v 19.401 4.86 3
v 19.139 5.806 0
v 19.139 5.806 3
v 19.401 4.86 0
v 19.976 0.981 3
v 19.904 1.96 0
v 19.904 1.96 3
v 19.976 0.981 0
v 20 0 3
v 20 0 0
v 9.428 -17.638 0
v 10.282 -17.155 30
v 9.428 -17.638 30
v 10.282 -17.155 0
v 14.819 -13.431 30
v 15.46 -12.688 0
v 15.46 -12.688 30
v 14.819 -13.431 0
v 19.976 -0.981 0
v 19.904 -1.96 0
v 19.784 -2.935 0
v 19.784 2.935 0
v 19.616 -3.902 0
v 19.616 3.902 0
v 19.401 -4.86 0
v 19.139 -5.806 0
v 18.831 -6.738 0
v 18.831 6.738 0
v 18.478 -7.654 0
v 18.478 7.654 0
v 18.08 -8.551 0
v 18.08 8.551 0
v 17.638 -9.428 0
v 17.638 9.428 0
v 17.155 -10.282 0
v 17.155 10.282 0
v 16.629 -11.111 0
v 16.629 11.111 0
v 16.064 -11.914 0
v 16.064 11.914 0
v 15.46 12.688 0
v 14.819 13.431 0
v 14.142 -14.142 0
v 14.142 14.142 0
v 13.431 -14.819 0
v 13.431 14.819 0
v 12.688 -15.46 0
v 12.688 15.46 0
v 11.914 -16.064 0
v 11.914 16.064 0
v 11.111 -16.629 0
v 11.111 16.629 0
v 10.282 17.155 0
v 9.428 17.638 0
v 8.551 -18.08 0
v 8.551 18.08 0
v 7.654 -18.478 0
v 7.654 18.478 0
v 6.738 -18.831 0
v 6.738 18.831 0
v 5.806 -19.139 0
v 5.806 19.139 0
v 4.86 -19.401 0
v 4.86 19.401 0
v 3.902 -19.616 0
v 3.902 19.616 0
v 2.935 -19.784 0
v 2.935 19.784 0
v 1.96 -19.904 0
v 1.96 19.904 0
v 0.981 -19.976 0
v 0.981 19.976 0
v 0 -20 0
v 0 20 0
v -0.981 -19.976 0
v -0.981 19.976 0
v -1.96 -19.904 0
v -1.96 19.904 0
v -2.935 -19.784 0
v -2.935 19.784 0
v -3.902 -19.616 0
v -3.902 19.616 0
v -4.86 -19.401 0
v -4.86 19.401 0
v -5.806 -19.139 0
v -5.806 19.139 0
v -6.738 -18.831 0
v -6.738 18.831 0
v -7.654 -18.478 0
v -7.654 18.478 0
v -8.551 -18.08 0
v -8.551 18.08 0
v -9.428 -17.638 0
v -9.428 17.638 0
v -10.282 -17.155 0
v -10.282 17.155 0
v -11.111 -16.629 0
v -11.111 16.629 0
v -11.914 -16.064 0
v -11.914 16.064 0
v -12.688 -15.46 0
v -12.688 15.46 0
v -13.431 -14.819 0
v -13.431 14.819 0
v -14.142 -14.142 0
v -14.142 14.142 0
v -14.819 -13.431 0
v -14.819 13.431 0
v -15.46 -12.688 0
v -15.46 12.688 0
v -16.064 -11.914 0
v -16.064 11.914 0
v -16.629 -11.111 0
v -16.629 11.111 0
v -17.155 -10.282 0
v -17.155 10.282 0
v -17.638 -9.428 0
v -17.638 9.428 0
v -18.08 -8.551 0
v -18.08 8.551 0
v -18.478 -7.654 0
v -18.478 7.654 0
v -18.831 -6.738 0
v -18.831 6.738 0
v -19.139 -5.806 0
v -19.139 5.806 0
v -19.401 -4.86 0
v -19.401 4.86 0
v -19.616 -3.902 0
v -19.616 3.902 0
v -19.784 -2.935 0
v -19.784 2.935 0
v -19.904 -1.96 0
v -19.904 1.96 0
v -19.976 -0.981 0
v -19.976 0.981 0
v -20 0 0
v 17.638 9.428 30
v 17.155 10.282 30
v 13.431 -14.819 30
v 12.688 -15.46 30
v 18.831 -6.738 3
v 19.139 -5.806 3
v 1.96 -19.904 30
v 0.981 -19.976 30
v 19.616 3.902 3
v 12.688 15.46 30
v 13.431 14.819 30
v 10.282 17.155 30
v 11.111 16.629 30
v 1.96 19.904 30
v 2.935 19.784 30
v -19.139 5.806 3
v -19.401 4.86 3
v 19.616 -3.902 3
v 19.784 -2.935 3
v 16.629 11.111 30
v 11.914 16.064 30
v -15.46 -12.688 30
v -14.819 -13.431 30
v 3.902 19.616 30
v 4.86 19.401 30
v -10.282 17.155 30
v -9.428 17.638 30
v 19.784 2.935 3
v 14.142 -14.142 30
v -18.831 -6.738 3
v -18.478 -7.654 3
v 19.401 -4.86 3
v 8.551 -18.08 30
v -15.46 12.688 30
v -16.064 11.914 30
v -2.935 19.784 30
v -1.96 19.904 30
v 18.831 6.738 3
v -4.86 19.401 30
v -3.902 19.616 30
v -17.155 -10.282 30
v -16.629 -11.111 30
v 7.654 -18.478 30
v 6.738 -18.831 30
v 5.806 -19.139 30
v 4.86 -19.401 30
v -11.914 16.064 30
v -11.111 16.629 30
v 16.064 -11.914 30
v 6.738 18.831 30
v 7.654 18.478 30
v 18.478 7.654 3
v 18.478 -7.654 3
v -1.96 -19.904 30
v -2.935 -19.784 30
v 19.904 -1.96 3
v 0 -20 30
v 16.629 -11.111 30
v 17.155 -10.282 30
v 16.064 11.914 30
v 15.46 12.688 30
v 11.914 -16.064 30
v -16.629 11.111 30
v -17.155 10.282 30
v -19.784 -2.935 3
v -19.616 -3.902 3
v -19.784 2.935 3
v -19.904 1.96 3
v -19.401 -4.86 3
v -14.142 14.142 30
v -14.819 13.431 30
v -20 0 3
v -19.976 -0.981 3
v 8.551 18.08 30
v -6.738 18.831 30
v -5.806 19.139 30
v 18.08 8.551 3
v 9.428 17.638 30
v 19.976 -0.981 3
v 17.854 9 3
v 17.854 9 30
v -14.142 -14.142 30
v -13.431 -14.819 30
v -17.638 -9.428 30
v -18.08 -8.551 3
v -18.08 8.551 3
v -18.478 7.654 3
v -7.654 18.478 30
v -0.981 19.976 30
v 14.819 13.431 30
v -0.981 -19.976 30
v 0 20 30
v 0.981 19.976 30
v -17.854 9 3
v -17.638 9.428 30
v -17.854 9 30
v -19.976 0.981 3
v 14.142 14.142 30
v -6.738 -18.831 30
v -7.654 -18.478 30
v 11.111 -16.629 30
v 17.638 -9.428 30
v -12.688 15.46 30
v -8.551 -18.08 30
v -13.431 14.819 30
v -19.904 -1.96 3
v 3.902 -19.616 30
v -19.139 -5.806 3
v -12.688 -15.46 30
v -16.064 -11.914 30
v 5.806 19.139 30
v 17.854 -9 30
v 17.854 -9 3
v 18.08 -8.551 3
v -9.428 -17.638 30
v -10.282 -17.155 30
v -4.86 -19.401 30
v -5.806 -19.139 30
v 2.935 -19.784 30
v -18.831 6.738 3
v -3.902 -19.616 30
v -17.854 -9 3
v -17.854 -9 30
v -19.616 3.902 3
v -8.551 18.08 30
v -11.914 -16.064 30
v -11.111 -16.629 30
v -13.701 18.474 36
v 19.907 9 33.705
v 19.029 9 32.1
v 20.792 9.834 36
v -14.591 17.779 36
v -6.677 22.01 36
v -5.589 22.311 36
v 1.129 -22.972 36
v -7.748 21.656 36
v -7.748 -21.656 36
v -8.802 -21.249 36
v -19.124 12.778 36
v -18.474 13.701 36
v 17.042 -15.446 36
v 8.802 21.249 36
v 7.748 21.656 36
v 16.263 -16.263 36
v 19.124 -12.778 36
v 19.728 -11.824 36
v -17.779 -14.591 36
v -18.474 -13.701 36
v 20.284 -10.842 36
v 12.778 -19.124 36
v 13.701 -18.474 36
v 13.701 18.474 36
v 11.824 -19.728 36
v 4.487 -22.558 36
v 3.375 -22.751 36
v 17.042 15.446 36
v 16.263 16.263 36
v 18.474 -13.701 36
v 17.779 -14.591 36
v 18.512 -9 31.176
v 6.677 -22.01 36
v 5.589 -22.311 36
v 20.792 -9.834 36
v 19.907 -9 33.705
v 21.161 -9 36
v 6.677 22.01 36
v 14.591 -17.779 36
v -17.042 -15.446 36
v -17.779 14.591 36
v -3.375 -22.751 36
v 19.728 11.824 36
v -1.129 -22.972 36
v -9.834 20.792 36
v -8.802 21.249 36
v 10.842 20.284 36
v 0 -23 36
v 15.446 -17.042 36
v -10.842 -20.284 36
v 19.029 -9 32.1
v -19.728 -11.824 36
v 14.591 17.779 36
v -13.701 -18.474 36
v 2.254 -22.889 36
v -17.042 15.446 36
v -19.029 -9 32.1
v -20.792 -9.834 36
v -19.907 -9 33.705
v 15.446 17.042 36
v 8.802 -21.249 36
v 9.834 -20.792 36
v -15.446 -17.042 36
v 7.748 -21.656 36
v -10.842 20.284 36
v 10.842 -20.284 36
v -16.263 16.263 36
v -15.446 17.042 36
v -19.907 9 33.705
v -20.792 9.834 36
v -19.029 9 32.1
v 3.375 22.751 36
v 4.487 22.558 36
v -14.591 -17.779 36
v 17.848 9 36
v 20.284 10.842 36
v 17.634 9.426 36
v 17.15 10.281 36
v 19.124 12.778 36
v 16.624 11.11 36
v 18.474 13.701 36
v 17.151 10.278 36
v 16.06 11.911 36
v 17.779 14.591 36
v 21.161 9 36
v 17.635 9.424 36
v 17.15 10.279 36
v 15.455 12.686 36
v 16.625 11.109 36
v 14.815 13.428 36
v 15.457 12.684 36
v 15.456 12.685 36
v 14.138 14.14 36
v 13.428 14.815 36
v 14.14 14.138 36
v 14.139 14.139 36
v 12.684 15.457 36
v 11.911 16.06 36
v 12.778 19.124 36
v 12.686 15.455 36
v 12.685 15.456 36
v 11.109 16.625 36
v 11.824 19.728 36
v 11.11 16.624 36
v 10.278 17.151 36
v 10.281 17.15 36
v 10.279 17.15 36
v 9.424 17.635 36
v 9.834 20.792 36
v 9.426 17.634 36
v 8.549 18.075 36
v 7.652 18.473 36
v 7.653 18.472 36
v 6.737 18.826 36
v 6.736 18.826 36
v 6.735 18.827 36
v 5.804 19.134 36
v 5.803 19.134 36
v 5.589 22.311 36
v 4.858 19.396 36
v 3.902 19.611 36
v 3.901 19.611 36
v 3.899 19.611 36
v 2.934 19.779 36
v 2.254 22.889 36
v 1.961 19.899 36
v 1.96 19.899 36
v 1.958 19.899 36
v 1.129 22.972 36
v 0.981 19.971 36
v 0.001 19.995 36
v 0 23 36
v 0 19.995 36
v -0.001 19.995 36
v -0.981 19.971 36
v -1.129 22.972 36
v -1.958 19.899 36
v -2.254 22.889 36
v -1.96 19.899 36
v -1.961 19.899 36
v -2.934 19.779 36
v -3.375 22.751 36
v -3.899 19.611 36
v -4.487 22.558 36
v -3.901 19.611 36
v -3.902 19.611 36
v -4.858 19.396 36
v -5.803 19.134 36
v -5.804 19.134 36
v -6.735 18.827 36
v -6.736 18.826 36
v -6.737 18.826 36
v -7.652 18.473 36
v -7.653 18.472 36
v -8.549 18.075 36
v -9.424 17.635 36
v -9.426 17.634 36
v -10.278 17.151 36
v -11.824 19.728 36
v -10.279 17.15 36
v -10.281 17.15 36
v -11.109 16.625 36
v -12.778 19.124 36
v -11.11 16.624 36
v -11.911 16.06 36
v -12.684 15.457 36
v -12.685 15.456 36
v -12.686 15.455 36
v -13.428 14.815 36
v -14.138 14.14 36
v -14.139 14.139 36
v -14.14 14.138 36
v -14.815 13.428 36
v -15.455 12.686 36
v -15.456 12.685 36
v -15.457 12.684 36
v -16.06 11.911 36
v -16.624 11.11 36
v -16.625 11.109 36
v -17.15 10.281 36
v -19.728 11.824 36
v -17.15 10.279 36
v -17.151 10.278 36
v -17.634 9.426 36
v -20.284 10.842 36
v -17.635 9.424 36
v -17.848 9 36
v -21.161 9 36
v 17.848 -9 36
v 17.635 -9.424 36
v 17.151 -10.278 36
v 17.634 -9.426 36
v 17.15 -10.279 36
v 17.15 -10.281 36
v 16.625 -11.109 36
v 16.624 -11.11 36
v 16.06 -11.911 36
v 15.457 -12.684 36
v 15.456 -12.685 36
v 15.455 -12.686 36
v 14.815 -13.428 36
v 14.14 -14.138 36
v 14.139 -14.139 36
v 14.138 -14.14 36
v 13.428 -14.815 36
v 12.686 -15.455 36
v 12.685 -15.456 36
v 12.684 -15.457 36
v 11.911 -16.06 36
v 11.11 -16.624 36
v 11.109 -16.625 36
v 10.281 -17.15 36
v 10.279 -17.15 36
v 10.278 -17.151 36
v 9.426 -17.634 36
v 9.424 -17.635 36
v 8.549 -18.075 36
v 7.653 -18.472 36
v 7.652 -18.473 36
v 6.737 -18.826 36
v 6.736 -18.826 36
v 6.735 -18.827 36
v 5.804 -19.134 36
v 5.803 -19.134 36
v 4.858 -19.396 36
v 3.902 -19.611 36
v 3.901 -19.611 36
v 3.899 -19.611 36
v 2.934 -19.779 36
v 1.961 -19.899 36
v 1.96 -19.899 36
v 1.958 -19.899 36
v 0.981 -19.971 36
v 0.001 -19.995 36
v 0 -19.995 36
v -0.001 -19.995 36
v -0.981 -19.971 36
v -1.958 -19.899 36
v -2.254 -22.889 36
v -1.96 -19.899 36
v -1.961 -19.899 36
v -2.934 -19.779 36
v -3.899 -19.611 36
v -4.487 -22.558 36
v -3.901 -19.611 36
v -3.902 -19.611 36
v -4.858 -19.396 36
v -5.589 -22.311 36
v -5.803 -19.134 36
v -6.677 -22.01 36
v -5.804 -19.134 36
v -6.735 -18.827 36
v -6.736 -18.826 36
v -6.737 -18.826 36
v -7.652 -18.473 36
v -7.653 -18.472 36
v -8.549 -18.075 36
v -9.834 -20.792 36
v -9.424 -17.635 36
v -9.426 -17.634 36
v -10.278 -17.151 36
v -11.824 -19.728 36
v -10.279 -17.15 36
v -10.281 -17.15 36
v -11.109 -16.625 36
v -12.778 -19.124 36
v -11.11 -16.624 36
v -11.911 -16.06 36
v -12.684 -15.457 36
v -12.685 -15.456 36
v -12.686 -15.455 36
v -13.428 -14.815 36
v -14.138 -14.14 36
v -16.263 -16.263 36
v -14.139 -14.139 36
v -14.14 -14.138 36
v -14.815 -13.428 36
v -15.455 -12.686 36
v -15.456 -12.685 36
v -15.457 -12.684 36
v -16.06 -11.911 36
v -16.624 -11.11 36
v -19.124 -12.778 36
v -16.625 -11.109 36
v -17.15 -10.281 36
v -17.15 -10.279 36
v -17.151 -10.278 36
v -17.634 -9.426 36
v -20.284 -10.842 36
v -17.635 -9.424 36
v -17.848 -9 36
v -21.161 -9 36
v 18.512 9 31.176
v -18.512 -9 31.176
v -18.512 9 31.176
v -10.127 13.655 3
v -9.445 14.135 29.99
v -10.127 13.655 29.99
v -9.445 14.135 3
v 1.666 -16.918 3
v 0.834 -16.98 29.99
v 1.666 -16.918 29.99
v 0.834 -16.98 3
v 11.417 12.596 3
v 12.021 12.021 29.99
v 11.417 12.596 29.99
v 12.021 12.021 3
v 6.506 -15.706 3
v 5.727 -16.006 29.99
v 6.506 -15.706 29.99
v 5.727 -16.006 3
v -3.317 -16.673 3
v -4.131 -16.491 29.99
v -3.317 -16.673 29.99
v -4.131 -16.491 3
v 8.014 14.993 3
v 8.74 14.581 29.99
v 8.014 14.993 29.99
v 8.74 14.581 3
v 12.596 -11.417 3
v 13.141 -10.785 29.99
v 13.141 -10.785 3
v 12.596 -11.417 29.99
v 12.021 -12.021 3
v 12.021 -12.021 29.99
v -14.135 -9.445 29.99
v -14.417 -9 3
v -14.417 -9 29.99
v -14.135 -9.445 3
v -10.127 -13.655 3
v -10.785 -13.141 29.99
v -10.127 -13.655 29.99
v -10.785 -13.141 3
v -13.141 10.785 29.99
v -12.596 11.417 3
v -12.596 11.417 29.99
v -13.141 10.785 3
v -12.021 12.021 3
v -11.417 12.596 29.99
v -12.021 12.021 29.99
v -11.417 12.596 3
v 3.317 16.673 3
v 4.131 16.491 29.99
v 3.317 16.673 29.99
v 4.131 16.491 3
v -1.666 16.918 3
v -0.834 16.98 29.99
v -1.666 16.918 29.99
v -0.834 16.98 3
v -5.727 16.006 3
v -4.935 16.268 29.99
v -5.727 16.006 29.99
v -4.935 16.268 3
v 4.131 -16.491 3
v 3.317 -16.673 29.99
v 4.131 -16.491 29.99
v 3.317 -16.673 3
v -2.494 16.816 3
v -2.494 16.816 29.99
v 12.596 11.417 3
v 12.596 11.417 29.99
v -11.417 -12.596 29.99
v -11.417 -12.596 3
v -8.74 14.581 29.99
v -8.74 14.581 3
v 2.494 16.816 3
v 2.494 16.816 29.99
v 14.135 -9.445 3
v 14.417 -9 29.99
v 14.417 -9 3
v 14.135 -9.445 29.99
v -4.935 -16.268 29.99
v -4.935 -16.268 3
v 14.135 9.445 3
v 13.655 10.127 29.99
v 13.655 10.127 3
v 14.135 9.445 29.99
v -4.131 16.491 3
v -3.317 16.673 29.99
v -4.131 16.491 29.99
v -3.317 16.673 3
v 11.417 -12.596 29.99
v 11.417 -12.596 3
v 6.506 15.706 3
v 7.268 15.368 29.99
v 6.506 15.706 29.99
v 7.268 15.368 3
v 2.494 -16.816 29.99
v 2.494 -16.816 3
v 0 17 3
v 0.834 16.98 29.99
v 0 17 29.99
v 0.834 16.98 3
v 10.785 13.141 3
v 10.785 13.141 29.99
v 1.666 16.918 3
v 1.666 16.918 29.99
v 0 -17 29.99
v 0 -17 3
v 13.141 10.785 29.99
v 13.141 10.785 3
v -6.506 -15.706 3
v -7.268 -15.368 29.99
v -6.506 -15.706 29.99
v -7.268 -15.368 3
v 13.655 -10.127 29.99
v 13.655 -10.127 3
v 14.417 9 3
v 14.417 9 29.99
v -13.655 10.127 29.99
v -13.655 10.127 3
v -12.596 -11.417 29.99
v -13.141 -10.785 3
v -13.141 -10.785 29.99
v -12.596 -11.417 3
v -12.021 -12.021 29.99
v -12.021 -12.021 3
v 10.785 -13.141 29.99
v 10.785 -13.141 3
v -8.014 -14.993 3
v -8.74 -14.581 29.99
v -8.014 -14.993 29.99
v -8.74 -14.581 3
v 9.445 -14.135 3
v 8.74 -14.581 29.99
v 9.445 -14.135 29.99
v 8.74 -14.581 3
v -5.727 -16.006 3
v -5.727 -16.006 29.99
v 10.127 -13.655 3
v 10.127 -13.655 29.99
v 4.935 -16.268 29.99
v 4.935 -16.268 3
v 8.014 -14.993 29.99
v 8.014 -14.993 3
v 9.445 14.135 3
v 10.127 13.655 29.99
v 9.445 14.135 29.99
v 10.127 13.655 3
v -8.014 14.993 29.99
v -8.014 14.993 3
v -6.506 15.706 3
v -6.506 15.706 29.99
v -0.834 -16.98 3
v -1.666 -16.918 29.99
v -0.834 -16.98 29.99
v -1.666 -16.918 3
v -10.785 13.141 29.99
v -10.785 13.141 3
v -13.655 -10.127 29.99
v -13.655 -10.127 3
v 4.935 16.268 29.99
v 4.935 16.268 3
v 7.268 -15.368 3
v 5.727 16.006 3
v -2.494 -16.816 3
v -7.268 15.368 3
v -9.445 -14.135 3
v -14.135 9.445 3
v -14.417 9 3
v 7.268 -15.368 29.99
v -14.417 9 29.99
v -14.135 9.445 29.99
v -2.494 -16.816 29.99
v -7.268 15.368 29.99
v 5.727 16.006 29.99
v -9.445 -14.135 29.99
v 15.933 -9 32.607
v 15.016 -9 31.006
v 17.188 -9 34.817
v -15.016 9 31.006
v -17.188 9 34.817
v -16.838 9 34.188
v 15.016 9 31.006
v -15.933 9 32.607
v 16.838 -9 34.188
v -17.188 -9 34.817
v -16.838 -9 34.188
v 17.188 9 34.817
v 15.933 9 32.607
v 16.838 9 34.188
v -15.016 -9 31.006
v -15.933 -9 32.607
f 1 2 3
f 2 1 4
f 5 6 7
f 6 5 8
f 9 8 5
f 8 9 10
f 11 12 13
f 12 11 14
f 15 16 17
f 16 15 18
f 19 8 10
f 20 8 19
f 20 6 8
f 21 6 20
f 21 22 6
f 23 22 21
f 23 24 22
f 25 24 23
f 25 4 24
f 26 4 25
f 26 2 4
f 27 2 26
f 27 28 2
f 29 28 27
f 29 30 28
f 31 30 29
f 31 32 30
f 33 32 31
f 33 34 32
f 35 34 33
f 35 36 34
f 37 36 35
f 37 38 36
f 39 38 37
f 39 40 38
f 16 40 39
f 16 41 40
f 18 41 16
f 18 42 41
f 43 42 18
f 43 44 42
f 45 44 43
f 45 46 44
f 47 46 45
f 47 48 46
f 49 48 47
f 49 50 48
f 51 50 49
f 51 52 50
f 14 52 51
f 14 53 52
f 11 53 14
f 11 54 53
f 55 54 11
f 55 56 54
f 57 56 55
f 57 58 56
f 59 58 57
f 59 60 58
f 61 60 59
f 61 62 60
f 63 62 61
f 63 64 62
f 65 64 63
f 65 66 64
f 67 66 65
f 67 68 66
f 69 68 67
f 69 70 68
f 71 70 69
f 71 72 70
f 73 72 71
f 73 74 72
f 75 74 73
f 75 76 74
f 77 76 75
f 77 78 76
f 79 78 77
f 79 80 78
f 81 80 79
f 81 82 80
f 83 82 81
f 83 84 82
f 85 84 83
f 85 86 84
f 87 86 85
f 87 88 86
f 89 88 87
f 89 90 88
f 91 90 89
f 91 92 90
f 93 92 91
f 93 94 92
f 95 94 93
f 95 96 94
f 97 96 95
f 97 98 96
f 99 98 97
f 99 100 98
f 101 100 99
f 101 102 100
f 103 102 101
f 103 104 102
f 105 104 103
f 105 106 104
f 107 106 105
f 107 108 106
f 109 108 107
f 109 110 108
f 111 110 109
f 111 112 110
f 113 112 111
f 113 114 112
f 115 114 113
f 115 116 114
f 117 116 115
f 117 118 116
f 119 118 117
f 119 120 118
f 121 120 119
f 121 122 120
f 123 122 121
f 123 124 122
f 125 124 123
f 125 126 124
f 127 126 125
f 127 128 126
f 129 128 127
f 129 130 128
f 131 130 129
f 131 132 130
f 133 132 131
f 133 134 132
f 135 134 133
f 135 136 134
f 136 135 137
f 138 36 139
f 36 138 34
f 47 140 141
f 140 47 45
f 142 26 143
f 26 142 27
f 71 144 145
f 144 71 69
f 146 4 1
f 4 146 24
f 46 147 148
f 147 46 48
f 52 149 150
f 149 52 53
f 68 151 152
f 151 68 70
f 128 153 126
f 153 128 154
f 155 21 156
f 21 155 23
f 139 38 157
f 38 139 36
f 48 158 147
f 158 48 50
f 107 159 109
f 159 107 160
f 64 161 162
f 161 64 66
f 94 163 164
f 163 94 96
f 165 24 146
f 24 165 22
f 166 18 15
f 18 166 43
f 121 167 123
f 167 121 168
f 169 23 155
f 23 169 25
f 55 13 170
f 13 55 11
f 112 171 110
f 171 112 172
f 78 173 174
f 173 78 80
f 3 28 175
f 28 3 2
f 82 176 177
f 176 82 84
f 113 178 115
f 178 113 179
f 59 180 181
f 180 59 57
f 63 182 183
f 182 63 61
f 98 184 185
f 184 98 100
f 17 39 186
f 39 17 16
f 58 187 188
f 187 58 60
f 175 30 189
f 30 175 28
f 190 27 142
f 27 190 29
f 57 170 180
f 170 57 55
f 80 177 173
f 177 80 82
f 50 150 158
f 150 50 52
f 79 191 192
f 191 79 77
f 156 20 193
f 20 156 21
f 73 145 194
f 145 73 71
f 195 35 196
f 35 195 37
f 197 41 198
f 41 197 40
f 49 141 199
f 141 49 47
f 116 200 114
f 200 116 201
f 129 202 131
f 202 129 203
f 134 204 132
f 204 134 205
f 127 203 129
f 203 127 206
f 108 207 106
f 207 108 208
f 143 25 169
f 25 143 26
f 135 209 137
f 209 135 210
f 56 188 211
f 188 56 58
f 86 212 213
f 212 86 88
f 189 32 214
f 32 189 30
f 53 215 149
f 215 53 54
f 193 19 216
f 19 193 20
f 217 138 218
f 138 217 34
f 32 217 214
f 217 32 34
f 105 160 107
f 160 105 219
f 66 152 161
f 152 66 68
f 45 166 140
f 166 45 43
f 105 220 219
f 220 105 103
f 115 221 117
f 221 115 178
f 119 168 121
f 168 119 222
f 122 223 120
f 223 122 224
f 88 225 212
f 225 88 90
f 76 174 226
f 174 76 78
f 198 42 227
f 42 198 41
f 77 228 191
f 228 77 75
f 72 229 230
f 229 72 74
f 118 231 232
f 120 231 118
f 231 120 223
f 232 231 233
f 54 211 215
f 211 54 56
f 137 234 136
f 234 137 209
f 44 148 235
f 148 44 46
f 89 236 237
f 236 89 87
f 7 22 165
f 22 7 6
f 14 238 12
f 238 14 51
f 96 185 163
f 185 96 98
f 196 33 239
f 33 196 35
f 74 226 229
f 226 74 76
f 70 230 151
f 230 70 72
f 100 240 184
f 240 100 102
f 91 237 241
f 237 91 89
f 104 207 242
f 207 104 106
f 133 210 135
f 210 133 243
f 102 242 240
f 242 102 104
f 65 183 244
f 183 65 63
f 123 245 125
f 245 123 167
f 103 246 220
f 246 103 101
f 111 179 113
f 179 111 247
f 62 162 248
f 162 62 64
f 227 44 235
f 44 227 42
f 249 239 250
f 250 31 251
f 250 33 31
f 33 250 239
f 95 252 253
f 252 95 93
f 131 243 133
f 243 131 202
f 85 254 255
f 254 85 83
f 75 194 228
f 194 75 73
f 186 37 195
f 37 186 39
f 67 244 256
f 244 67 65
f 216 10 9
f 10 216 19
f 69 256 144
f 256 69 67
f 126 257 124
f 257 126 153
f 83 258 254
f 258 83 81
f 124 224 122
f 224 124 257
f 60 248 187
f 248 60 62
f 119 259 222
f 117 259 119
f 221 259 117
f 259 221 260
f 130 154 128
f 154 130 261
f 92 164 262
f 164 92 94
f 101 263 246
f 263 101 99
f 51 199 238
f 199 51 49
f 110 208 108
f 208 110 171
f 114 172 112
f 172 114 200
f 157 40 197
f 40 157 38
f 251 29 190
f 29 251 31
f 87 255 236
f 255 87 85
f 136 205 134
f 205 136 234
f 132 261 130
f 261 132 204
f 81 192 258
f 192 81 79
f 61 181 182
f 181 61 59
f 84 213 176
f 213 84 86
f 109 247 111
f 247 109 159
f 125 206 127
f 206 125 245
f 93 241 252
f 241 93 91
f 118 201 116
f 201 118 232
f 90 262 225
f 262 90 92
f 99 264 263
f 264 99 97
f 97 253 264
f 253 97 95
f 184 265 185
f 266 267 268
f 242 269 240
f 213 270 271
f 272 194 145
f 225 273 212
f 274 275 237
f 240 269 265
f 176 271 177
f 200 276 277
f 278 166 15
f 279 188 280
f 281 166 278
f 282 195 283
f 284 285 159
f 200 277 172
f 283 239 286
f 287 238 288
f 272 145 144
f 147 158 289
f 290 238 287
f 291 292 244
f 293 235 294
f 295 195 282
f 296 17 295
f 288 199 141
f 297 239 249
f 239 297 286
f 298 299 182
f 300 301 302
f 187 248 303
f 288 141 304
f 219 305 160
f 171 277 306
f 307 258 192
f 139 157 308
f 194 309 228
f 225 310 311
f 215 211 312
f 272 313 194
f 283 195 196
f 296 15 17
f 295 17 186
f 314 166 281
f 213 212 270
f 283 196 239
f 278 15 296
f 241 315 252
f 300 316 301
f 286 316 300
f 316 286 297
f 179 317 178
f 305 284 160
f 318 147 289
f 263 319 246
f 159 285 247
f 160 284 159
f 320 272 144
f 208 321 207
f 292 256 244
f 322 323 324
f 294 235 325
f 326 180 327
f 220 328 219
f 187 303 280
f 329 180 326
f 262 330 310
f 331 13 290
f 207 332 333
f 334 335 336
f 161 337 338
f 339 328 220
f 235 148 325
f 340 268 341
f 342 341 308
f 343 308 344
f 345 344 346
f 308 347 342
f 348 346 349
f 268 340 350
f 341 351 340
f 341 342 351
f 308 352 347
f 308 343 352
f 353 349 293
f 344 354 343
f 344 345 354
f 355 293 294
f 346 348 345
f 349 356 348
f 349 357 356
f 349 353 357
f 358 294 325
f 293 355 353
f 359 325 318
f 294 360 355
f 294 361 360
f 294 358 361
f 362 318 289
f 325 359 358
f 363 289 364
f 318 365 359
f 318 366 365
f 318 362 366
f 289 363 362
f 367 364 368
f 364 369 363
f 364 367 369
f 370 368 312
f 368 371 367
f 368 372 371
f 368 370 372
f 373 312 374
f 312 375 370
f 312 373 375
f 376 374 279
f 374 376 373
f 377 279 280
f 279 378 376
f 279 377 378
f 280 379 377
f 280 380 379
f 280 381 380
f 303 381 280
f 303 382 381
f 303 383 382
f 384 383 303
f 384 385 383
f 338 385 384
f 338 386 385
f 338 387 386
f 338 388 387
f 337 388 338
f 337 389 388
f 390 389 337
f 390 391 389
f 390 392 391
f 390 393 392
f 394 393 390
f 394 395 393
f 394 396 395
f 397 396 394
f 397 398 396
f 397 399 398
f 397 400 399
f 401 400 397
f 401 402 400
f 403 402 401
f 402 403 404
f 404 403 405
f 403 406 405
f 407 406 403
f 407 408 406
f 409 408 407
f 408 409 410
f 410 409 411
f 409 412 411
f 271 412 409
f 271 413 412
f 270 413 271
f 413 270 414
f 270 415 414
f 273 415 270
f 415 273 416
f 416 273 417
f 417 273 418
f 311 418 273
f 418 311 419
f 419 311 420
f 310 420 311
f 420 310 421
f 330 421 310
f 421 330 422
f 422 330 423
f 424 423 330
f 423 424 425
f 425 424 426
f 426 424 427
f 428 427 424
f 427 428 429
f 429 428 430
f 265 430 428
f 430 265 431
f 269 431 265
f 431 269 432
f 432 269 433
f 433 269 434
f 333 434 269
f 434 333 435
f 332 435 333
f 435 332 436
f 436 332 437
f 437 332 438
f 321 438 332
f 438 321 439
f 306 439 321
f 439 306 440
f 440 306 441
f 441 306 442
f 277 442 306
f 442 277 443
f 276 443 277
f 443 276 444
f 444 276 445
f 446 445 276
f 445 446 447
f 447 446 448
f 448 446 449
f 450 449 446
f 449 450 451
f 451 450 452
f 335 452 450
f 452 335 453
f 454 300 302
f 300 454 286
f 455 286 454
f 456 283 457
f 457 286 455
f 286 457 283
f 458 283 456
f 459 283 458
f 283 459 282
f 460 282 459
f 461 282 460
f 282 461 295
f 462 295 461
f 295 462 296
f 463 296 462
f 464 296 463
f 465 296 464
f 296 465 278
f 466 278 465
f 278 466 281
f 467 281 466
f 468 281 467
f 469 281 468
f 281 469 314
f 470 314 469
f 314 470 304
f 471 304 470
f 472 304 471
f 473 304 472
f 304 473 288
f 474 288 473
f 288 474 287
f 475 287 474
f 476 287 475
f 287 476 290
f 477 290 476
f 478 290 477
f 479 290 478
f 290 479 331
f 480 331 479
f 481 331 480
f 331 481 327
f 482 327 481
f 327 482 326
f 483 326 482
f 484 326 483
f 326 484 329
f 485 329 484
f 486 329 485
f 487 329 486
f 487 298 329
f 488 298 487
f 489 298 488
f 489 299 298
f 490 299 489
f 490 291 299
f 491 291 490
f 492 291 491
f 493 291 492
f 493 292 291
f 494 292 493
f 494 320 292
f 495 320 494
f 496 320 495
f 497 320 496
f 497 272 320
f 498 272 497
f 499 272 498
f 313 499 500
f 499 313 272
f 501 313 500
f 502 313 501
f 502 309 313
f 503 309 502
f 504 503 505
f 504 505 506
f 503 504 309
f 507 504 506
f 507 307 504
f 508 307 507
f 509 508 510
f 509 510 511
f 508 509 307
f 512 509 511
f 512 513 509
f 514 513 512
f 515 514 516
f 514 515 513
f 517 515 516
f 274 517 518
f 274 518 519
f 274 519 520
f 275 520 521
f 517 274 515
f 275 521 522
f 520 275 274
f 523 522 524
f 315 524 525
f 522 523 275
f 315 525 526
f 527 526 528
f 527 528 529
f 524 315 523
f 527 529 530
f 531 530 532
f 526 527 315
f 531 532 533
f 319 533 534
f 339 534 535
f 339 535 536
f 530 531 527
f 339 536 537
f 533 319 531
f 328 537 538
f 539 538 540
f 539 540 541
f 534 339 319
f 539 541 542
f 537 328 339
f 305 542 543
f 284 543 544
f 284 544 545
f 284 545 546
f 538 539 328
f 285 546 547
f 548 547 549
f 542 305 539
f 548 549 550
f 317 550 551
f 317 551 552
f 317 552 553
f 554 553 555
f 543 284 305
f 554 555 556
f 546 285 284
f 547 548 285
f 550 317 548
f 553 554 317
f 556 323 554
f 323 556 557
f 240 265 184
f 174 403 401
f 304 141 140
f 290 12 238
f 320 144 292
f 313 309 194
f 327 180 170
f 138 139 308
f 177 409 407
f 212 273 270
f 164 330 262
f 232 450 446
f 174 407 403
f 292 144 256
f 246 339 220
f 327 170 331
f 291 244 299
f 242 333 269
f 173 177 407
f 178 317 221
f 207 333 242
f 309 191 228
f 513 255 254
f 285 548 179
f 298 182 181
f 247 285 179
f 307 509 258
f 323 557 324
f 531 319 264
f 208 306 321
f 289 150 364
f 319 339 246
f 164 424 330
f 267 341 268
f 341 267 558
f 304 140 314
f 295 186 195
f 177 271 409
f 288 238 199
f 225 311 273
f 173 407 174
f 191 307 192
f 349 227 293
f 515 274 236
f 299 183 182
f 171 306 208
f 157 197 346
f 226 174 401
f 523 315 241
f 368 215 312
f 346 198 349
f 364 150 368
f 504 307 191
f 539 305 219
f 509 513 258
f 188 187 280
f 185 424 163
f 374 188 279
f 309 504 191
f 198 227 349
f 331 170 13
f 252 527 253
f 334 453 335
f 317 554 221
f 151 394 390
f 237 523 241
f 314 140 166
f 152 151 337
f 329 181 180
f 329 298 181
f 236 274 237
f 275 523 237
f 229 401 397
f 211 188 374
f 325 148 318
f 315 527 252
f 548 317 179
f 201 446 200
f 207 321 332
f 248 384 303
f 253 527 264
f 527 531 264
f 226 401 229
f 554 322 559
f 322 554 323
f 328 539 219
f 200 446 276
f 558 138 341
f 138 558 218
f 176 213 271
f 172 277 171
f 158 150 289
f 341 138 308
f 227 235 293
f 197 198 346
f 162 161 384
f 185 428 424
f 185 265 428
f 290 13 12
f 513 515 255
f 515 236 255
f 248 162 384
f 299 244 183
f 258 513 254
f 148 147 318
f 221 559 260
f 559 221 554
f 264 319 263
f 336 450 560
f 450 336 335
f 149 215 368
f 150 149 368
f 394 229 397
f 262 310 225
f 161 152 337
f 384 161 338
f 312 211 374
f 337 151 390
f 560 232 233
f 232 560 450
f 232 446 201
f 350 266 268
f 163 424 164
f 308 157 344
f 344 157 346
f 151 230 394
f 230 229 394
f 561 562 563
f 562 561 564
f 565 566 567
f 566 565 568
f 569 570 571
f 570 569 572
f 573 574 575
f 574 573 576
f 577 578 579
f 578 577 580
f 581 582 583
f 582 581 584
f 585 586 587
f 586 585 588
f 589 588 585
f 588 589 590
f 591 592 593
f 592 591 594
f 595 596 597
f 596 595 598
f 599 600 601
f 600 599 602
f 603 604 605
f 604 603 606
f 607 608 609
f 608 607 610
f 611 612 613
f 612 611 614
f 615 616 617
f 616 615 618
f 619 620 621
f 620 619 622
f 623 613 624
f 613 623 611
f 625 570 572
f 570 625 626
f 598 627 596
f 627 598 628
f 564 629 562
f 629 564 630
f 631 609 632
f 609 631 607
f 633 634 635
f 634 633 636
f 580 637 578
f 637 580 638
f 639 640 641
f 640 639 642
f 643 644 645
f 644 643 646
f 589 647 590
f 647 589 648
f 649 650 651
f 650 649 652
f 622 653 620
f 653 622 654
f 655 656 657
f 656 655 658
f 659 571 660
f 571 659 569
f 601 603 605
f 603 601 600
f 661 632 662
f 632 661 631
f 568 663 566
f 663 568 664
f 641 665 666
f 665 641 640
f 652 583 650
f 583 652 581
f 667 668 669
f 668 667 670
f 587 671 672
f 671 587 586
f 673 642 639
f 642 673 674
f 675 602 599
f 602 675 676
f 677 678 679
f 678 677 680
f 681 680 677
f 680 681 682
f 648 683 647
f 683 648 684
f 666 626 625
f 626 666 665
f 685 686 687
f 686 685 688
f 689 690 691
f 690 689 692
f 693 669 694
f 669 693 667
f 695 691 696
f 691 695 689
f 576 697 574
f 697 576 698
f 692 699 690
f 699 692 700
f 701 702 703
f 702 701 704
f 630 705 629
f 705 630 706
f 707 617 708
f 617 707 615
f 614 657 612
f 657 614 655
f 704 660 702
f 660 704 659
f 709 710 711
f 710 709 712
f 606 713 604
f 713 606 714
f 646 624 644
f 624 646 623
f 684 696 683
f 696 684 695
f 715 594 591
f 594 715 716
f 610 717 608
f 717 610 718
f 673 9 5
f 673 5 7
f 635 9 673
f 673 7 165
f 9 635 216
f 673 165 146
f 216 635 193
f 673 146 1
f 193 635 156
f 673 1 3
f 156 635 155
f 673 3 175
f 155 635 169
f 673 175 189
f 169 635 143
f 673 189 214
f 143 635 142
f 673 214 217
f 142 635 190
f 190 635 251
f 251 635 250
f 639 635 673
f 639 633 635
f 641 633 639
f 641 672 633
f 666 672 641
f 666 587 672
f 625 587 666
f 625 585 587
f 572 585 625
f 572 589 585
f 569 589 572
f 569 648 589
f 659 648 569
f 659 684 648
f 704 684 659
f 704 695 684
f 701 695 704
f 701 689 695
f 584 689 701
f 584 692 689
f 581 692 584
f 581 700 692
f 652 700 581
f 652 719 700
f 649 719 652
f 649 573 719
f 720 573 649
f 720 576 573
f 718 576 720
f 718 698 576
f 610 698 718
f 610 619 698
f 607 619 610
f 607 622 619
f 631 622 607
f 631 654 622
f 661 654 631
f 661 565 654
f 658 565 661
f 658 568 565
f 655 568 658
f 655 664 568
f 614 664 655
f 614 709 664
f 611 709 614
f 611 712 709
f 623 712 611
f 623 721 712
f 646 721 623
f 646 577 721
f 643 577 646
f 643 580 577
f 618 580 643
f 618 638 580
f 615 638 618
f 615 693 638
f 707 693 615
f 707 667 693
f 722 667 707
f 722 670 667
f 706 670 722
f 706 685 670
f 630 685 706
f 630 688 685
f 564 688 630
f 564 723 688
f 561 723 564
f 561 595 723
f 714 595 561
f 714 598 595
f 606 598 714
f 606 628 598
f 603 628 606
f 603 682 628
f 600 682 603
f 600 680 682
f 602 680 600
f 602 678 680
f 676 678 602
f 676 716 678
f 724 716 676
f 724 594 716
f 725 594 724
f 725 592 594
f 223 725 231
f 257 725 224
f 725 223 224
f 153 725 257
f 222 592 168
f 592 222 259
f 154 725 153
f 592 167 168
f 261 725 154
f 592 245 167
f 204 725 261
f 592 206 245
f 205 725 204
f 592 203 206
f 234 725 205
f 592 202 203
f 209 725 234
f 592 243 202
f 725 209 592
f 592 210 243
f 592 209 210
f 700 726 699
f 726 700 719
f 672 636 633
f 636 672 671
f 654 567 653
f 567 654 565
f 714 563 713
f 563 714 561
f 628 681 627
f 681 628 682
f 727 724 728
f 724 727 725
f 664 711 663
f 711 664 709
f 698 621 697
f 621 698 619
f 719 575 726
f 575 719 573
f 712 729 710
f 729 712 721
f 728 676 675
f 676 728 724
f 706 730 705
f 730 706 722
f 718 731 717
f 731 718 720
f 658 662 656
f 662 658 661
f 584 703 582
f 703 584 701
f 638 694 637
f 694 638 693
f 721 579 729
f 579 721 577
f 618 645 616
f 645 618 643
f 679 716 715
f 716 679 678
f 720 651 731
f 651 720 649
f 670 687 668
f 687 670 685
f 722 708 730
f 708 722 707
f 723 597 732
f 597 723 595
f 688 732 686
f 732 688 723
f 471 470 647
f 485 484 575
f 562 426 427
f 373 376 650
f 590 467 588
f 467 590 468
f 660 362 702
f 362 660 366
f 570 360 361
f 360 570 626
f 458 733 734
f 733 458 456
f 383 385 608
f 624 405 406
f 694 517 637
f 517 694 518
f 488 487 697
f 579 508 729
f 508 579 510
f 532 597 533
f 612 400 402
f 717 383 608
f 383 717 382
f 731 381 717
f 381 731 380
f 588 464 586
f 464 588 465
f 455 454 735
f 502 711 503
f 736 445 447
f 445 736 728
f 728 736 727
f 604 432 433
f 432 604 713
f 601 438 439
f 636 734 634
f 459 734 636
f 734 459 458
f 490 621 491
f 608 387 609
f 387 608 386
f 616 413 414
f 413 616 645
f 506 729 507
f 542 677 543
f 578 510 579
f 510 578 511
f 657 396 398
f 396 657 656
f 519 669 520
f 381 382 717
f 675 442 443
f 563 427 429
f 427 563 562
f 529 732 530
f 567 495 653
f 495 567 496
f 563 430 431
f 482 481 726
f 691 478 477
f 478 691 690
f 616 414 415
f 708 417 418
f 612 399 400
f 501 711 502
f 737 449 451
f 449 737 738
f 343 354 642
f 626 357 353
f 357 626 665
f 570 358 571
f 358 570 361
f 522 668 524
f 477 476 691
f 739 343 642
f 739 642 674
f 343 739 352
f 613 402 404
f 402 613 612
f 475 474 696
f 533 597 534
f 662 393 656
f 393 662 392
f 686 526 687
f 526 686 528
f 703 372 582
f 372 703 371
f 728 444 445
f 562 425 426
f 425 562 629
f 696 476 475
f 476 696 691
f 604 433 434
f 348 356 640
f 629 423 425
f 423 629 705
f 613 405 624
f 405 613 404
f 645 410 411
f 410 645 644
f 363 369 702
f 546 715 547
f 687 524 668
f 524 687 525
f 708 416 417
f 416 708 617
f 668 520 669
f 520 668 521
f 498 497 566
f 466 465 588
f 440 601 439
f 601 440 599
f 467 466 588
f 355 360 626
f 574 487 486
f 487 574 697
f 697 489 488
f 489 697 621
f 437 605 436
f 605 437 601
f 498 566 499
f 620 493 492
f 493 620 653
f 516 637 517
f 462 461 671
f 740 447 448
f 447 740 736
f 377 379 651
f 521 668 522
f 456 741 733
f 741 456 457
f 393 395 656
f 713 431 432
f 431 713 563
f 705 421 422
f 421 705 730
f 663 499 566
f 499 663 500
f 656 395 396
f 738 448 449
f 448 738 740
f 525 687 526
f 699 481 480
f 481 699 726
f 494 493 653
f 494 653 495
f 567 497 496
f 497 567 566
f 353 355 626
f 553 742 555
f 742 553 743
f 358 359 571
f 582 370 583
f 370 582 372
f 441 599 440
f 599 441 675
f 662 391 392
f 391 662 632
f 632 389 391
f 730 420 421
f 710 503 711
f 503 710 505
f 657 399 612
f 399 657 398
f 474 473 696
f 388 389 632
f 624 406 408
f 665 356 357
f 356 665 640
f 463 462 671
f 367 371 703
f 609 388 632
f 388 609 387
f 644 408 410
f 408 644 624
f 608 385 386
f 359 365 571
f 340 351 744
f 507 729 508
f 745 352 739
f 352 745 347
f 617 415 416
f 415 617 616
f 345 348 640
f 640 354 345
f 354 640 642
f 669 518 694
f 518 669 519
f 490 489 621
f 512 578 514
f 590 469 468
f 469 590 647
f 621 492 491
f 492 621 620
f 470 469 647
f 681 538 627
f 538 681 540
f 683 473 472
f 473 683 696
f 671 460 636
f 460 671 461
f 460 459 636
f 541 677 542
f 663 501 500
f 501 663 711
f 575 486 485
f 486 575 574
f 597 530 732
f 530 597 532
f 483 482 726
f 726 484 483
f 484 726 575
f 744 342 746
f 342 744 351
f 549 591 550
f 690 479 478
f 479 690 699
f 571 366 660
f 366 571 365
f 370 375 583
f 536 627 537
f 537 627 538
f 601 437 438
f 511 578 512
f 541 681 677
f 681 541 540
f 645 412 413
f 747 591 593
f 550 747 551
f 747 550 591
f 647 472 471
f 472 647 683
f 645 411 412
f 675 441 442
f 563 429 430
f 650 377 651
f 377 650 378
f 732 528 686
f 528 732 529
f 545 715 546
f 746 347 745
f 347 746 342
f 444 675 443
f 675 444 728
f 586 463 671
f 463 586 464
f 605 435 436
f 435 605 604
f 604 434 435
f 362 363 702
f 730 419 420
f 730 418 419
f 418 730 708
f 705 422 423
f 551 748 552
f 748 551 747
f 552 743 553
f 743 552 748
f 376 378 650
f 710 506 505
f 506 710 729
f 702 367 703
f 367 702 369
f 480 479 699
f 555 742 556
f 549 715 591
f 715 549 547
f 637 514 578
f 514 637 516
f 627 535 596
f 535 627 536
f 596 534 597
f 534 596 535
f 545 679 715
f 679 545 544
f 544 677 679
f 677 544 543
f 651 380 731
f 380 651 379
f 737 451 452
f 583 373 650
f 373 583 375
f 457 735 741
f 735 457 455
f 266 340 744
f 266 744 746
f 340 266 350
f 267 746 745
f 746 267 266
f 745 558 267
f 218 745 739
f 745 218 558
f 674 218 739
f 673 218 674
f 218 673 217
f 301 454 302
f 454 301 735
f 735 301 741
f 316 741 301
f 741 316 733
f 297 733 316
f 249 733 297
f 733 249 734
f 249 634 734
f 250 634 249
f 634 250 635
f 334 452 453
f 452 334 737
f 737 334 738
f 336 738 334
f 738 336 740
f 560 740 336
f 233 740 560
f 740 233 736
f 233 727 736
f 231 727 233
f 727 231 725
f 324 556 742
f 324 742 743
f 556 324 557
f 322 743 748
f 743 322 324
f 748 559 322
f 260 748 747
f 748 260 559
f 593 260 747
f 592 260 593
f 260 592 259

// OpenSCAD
// =============================================================
//  connect_four_top_grab_chute.scad  (v3 — cylinder with open sides)
//  Vertical piece dispenser — top-down gripper access
//
//  HOW IT WORKS
//  ------------
//  1. Drop pieces in from the open top — they stack flat (horizontal).
//  2. The arm descends from above (-Z) with fingers open (spread wide
//     in X, outside the tube diameter). No walls at ±X, so fingers
//     have unobstructed vertical travel.
//  3. At disc level, gripper closes: fingers move inward in X and
//     contact the TOP disc's rim at the 9-o'clock and 3-o'clock
//     positions.
//  4. Arm lifts the disc straight up, clears the tube.
//  5. Wrist rotates 90° — disc is now vertical (edge-down).
//  6. Arm moves over the target column, opens gripper → disc falls in.
//  7. Gravity drops the remaining stack down one disc-height. Repeat.
//
//  WHY A CYLINDER WITH WIDE OPENINGS
//  -----------------------------------
//  The ±X openings remove the cylinder wall in the finger-approach
//  zone, giving the gripper unobstructed vertical travel. The
//  remaining arc walls at ±Y self-center the round disc (curved wall
//  matches disc perimeter), which is better than flat walls.
//  The disc cannot fall out: the ±Y arcs constrain it to < 1.5 mm
//  lateral play in X.
//
//  TOP VIEW (cross-section)
//  ------------------------
//
//     finger              finger
//       │                    │
//       ↓                    ↓
//   (open +X side)     (open -X side)
//
//       ╔══════════════════╗
//       ║  arc wall (+Y)   ║
//       ╠══╡           ╞══╣   ← opening_w wide — fingers pass here
//       ║       ●          ║   ← disc, constrained by ±Y arcs
//       ╠══╡           ╞══╣
//       ║  arc wall (-Y)   ║
//       ╚══════════════════╝
//
//  CAPACITY vs PRINT BED (Flashforge Adventurer 3: 150×150×150 mm)
//  ----------------------------------------------------------------
//  At piece_t = 8.5 mm, max 16 pieces fit within 150 mm Z height.
//  Print 2 chutes per color. 2×16 = 32 total, covers a full game.
//
//  PRINT PLAN — per color, 4 prints total
//  ----------------------------------------
//  RENDER = "chute"  → chute.stl   print 2×
//  RENDER = "base"   → base.stl    print 2×
//  Tube press-fits into base socket; CA glue for permanence.
//
//  BENCH ORIENTATION
//  -----------------
//  Orient so the ±X openings align with the gripper's open/close axis.
//  The orientation notch on the base marks the +Y (solid arc) face.
// =============================================================

/* ── SELECT WHAT TO RENDER ────────────────────────────────── */

RENDER = "chute";   // "chute" | "base"

/* ── DISC DIMENSIONS (measured) ─────────────────────────────*/

piece_d = 32.0;   // disc diameter (mm)
piece_t =  3.4;   // effective stacking height per disc (mm).
                  // NOTE: the physical disc is ~8.5 mm thick, but the pieces
                  // interlock/nest when stacked so each disc only adds ~3.4 mm
                  // of height in the chute. Calibrated empirically: n_pieces=2
                  // at piece_t=8.5 produced a tube that fit 5 pieces, so
                  // piece_t was back-calculated as (tube_h - floor_t - top_clr)
                  // / n_pieces_actual = (30 - 3 - 10) / 5 = 3.4 mm.
                  // Do not change this unless you re-measure with your discs.

/* ── CHUTE PARAMETERS ────────────────────────────────────────*/

n_pieces   = 5;    // pieces per chute — controls tube height. Set to 5 for
                   // the current print. Scale up for a taller chute later.

wall_t     = 3.0;   // tube wall thickness (mm)
floor_t    = 3.0;   // floor below disc stack (mm)
id_clr     = 1.0;   // radial clearance per side — disc slides freely (mm)
top_clr    = 10.0;  // headroom above top disc for easy loading (mm)

// ±X side opening — cut through the cylinder wall at ±X in this Y band.
// opening_w must be:
//   > finger pad width (~10 mm for SO-101)  so fingers close without hitting arc
//   < disc diameter (32 mm)                 so disc cannot fall out sideways
opening_w  = 18.0;  // opening width in Y (mm). Default 18 mm.

// Loading chamfer at top
chamfer_h  = 6.0;   // height of inner flare at top (mm)
chamfer_r  = 3.0;   // extra inner radius at very top (mm)

/* ── BASE PARAMETERS ─────────────────────────────────────────*/

base_d       = 84.0;
base_h       = 12.0;
socket_clr   =  0.3;
socket_depth =  8.0;
notch_w      =  8.0;
notch_d      =  3.0;

/* ── DERIVED — do not edit ───────────────────────────────────*/

$fn = 128;

inner_r  = piece_d / 2 + id_clr;
outer_r  = inner_r + wall_t;
inner_d  = inner_r * 2;
outer_d  = outer_r * 2;

tube_h   = floor_t + n_pieces * piece_t + top_clr;
max_n    = floor((150 - floor_t - top_clr) / piece_t);

// Disc lateral play in X: how far disc can slide before arc wall stops it.
// At Y = opening_w/2, arc wall inner face is at X = sqrt(inner_r²-(opening_w/2)²)
// and disc edge at Y = opening_w/2 is at X = sqrt((piece_d/2)²-(opening_w/2)²).
disc_play_x = sqrt(inner_r*inner_r - (opening_w/2)*(opening_w/2))
            - sqrt((piece_d/2)*(piece_d/2) - (opening_w/2)*(opening_w/2));

echo(str("═══════════════════════════════════════════"));
echo(str("  Tube:     OD=", outer_d, "  ID=", inner_d, "  H=", tube_h, " mm"));
echo(str("  Opening:  W=", opening_w, " mm in Y  (disc=", piece_d,
         " mm — retained: ", (opening_w < piece_d) ? "YES" : "NO", ")"));
echo(str("  Disc lateral play: ", disc_play_x, " mm  (should be < 2 mm)"));
echo(str("  Bed fit:  ", (tube_h <= 150)
    ? str("OK  (", 150 - tube_h, " mm to spare)")
    : str("OVER by ", tube_h - 150, " mm — set n_pieces ≤ ", max_n)));
echo(str("═══════════════════════════════════════════"));

/* ── CHUTE ────────────────────────────────────────────────── */

module chute() {
    difference() {
        union() {
            // Main cylinder
            cylinder(h = tube_h, r = outer_r);

            // Loading chamfer: flared inner rim at top for easy loading
            translate([0, 0, tube_h])
                cylinder(h = chamfer_h, r1 = outer_r, r2 = outer_r + chamfer_r);
        }

        // ── Inner bore ─────────────────────────────────────────
        translate([0, 0, floor_t])
            cylinder(h = tube_h - floor_t + 0.01, r = inner_r);

        // ── Inner bore chamfer ─────────────────────────────────
        translate([0, 0, tube_h - 0.01])
            cylinder(h = chamfer_h + 0.02, r1 = inner_r, r2 = inner_r + chamfer_r);

        // ── +X side opening ────────────────────────────────────
        // Removes the cylinder wall in the +X half within the Y band.
        // Finger descends at X > outer_r, closes inward to grip disc rim.
        // X extent reaches outer_r + chamfer_r so the chamfer flare is
        // also cleared — without this a sliver of chamfer is left at ±X.
        translate([0, -opening_w / 2, floor_t])
            cube([outer_r + chamfer_r + 1, opening_w, tube_h - floor_t + chamfer_h + 0.02]);

        // ── -X side opening (mirror) ───────────────────────────
        translate([-(outer_r + chamfer_r + 1), -opening_w / 2, floor_t])
            cube([outer_r + chamfer_r + 1, opening_w, tube_h - floor_t + chamfer_h + 0.02]);
    }
}

/* ── BASE ─────────────────────────────────────────────────── */

module base() {
    difference() {
        cylinder(h = base_h, r = base_d / 2);

        // Circular socket — tube press-fits here.
        // Lower floor_t of tube is a full cylinder; socket grips it.
        translate([0, 0, base_h - socket_depth])
            cylinder(h = socket_depth + 0.01, r = outer_r + socket_clr);

        // Orientation notch on +Y face (the solid arc side)
        translate([-notch_w / 2, base_d / 2 - notch_d, -0.01])
            cube([notch_w, notch_d + 0.01, base_h + 0.02]);
    }
}

/* ── RENDER ───────────────────────────────────────────────── */

if (RENDER == "chute") chute();
if (RENDER == "base")  base();
